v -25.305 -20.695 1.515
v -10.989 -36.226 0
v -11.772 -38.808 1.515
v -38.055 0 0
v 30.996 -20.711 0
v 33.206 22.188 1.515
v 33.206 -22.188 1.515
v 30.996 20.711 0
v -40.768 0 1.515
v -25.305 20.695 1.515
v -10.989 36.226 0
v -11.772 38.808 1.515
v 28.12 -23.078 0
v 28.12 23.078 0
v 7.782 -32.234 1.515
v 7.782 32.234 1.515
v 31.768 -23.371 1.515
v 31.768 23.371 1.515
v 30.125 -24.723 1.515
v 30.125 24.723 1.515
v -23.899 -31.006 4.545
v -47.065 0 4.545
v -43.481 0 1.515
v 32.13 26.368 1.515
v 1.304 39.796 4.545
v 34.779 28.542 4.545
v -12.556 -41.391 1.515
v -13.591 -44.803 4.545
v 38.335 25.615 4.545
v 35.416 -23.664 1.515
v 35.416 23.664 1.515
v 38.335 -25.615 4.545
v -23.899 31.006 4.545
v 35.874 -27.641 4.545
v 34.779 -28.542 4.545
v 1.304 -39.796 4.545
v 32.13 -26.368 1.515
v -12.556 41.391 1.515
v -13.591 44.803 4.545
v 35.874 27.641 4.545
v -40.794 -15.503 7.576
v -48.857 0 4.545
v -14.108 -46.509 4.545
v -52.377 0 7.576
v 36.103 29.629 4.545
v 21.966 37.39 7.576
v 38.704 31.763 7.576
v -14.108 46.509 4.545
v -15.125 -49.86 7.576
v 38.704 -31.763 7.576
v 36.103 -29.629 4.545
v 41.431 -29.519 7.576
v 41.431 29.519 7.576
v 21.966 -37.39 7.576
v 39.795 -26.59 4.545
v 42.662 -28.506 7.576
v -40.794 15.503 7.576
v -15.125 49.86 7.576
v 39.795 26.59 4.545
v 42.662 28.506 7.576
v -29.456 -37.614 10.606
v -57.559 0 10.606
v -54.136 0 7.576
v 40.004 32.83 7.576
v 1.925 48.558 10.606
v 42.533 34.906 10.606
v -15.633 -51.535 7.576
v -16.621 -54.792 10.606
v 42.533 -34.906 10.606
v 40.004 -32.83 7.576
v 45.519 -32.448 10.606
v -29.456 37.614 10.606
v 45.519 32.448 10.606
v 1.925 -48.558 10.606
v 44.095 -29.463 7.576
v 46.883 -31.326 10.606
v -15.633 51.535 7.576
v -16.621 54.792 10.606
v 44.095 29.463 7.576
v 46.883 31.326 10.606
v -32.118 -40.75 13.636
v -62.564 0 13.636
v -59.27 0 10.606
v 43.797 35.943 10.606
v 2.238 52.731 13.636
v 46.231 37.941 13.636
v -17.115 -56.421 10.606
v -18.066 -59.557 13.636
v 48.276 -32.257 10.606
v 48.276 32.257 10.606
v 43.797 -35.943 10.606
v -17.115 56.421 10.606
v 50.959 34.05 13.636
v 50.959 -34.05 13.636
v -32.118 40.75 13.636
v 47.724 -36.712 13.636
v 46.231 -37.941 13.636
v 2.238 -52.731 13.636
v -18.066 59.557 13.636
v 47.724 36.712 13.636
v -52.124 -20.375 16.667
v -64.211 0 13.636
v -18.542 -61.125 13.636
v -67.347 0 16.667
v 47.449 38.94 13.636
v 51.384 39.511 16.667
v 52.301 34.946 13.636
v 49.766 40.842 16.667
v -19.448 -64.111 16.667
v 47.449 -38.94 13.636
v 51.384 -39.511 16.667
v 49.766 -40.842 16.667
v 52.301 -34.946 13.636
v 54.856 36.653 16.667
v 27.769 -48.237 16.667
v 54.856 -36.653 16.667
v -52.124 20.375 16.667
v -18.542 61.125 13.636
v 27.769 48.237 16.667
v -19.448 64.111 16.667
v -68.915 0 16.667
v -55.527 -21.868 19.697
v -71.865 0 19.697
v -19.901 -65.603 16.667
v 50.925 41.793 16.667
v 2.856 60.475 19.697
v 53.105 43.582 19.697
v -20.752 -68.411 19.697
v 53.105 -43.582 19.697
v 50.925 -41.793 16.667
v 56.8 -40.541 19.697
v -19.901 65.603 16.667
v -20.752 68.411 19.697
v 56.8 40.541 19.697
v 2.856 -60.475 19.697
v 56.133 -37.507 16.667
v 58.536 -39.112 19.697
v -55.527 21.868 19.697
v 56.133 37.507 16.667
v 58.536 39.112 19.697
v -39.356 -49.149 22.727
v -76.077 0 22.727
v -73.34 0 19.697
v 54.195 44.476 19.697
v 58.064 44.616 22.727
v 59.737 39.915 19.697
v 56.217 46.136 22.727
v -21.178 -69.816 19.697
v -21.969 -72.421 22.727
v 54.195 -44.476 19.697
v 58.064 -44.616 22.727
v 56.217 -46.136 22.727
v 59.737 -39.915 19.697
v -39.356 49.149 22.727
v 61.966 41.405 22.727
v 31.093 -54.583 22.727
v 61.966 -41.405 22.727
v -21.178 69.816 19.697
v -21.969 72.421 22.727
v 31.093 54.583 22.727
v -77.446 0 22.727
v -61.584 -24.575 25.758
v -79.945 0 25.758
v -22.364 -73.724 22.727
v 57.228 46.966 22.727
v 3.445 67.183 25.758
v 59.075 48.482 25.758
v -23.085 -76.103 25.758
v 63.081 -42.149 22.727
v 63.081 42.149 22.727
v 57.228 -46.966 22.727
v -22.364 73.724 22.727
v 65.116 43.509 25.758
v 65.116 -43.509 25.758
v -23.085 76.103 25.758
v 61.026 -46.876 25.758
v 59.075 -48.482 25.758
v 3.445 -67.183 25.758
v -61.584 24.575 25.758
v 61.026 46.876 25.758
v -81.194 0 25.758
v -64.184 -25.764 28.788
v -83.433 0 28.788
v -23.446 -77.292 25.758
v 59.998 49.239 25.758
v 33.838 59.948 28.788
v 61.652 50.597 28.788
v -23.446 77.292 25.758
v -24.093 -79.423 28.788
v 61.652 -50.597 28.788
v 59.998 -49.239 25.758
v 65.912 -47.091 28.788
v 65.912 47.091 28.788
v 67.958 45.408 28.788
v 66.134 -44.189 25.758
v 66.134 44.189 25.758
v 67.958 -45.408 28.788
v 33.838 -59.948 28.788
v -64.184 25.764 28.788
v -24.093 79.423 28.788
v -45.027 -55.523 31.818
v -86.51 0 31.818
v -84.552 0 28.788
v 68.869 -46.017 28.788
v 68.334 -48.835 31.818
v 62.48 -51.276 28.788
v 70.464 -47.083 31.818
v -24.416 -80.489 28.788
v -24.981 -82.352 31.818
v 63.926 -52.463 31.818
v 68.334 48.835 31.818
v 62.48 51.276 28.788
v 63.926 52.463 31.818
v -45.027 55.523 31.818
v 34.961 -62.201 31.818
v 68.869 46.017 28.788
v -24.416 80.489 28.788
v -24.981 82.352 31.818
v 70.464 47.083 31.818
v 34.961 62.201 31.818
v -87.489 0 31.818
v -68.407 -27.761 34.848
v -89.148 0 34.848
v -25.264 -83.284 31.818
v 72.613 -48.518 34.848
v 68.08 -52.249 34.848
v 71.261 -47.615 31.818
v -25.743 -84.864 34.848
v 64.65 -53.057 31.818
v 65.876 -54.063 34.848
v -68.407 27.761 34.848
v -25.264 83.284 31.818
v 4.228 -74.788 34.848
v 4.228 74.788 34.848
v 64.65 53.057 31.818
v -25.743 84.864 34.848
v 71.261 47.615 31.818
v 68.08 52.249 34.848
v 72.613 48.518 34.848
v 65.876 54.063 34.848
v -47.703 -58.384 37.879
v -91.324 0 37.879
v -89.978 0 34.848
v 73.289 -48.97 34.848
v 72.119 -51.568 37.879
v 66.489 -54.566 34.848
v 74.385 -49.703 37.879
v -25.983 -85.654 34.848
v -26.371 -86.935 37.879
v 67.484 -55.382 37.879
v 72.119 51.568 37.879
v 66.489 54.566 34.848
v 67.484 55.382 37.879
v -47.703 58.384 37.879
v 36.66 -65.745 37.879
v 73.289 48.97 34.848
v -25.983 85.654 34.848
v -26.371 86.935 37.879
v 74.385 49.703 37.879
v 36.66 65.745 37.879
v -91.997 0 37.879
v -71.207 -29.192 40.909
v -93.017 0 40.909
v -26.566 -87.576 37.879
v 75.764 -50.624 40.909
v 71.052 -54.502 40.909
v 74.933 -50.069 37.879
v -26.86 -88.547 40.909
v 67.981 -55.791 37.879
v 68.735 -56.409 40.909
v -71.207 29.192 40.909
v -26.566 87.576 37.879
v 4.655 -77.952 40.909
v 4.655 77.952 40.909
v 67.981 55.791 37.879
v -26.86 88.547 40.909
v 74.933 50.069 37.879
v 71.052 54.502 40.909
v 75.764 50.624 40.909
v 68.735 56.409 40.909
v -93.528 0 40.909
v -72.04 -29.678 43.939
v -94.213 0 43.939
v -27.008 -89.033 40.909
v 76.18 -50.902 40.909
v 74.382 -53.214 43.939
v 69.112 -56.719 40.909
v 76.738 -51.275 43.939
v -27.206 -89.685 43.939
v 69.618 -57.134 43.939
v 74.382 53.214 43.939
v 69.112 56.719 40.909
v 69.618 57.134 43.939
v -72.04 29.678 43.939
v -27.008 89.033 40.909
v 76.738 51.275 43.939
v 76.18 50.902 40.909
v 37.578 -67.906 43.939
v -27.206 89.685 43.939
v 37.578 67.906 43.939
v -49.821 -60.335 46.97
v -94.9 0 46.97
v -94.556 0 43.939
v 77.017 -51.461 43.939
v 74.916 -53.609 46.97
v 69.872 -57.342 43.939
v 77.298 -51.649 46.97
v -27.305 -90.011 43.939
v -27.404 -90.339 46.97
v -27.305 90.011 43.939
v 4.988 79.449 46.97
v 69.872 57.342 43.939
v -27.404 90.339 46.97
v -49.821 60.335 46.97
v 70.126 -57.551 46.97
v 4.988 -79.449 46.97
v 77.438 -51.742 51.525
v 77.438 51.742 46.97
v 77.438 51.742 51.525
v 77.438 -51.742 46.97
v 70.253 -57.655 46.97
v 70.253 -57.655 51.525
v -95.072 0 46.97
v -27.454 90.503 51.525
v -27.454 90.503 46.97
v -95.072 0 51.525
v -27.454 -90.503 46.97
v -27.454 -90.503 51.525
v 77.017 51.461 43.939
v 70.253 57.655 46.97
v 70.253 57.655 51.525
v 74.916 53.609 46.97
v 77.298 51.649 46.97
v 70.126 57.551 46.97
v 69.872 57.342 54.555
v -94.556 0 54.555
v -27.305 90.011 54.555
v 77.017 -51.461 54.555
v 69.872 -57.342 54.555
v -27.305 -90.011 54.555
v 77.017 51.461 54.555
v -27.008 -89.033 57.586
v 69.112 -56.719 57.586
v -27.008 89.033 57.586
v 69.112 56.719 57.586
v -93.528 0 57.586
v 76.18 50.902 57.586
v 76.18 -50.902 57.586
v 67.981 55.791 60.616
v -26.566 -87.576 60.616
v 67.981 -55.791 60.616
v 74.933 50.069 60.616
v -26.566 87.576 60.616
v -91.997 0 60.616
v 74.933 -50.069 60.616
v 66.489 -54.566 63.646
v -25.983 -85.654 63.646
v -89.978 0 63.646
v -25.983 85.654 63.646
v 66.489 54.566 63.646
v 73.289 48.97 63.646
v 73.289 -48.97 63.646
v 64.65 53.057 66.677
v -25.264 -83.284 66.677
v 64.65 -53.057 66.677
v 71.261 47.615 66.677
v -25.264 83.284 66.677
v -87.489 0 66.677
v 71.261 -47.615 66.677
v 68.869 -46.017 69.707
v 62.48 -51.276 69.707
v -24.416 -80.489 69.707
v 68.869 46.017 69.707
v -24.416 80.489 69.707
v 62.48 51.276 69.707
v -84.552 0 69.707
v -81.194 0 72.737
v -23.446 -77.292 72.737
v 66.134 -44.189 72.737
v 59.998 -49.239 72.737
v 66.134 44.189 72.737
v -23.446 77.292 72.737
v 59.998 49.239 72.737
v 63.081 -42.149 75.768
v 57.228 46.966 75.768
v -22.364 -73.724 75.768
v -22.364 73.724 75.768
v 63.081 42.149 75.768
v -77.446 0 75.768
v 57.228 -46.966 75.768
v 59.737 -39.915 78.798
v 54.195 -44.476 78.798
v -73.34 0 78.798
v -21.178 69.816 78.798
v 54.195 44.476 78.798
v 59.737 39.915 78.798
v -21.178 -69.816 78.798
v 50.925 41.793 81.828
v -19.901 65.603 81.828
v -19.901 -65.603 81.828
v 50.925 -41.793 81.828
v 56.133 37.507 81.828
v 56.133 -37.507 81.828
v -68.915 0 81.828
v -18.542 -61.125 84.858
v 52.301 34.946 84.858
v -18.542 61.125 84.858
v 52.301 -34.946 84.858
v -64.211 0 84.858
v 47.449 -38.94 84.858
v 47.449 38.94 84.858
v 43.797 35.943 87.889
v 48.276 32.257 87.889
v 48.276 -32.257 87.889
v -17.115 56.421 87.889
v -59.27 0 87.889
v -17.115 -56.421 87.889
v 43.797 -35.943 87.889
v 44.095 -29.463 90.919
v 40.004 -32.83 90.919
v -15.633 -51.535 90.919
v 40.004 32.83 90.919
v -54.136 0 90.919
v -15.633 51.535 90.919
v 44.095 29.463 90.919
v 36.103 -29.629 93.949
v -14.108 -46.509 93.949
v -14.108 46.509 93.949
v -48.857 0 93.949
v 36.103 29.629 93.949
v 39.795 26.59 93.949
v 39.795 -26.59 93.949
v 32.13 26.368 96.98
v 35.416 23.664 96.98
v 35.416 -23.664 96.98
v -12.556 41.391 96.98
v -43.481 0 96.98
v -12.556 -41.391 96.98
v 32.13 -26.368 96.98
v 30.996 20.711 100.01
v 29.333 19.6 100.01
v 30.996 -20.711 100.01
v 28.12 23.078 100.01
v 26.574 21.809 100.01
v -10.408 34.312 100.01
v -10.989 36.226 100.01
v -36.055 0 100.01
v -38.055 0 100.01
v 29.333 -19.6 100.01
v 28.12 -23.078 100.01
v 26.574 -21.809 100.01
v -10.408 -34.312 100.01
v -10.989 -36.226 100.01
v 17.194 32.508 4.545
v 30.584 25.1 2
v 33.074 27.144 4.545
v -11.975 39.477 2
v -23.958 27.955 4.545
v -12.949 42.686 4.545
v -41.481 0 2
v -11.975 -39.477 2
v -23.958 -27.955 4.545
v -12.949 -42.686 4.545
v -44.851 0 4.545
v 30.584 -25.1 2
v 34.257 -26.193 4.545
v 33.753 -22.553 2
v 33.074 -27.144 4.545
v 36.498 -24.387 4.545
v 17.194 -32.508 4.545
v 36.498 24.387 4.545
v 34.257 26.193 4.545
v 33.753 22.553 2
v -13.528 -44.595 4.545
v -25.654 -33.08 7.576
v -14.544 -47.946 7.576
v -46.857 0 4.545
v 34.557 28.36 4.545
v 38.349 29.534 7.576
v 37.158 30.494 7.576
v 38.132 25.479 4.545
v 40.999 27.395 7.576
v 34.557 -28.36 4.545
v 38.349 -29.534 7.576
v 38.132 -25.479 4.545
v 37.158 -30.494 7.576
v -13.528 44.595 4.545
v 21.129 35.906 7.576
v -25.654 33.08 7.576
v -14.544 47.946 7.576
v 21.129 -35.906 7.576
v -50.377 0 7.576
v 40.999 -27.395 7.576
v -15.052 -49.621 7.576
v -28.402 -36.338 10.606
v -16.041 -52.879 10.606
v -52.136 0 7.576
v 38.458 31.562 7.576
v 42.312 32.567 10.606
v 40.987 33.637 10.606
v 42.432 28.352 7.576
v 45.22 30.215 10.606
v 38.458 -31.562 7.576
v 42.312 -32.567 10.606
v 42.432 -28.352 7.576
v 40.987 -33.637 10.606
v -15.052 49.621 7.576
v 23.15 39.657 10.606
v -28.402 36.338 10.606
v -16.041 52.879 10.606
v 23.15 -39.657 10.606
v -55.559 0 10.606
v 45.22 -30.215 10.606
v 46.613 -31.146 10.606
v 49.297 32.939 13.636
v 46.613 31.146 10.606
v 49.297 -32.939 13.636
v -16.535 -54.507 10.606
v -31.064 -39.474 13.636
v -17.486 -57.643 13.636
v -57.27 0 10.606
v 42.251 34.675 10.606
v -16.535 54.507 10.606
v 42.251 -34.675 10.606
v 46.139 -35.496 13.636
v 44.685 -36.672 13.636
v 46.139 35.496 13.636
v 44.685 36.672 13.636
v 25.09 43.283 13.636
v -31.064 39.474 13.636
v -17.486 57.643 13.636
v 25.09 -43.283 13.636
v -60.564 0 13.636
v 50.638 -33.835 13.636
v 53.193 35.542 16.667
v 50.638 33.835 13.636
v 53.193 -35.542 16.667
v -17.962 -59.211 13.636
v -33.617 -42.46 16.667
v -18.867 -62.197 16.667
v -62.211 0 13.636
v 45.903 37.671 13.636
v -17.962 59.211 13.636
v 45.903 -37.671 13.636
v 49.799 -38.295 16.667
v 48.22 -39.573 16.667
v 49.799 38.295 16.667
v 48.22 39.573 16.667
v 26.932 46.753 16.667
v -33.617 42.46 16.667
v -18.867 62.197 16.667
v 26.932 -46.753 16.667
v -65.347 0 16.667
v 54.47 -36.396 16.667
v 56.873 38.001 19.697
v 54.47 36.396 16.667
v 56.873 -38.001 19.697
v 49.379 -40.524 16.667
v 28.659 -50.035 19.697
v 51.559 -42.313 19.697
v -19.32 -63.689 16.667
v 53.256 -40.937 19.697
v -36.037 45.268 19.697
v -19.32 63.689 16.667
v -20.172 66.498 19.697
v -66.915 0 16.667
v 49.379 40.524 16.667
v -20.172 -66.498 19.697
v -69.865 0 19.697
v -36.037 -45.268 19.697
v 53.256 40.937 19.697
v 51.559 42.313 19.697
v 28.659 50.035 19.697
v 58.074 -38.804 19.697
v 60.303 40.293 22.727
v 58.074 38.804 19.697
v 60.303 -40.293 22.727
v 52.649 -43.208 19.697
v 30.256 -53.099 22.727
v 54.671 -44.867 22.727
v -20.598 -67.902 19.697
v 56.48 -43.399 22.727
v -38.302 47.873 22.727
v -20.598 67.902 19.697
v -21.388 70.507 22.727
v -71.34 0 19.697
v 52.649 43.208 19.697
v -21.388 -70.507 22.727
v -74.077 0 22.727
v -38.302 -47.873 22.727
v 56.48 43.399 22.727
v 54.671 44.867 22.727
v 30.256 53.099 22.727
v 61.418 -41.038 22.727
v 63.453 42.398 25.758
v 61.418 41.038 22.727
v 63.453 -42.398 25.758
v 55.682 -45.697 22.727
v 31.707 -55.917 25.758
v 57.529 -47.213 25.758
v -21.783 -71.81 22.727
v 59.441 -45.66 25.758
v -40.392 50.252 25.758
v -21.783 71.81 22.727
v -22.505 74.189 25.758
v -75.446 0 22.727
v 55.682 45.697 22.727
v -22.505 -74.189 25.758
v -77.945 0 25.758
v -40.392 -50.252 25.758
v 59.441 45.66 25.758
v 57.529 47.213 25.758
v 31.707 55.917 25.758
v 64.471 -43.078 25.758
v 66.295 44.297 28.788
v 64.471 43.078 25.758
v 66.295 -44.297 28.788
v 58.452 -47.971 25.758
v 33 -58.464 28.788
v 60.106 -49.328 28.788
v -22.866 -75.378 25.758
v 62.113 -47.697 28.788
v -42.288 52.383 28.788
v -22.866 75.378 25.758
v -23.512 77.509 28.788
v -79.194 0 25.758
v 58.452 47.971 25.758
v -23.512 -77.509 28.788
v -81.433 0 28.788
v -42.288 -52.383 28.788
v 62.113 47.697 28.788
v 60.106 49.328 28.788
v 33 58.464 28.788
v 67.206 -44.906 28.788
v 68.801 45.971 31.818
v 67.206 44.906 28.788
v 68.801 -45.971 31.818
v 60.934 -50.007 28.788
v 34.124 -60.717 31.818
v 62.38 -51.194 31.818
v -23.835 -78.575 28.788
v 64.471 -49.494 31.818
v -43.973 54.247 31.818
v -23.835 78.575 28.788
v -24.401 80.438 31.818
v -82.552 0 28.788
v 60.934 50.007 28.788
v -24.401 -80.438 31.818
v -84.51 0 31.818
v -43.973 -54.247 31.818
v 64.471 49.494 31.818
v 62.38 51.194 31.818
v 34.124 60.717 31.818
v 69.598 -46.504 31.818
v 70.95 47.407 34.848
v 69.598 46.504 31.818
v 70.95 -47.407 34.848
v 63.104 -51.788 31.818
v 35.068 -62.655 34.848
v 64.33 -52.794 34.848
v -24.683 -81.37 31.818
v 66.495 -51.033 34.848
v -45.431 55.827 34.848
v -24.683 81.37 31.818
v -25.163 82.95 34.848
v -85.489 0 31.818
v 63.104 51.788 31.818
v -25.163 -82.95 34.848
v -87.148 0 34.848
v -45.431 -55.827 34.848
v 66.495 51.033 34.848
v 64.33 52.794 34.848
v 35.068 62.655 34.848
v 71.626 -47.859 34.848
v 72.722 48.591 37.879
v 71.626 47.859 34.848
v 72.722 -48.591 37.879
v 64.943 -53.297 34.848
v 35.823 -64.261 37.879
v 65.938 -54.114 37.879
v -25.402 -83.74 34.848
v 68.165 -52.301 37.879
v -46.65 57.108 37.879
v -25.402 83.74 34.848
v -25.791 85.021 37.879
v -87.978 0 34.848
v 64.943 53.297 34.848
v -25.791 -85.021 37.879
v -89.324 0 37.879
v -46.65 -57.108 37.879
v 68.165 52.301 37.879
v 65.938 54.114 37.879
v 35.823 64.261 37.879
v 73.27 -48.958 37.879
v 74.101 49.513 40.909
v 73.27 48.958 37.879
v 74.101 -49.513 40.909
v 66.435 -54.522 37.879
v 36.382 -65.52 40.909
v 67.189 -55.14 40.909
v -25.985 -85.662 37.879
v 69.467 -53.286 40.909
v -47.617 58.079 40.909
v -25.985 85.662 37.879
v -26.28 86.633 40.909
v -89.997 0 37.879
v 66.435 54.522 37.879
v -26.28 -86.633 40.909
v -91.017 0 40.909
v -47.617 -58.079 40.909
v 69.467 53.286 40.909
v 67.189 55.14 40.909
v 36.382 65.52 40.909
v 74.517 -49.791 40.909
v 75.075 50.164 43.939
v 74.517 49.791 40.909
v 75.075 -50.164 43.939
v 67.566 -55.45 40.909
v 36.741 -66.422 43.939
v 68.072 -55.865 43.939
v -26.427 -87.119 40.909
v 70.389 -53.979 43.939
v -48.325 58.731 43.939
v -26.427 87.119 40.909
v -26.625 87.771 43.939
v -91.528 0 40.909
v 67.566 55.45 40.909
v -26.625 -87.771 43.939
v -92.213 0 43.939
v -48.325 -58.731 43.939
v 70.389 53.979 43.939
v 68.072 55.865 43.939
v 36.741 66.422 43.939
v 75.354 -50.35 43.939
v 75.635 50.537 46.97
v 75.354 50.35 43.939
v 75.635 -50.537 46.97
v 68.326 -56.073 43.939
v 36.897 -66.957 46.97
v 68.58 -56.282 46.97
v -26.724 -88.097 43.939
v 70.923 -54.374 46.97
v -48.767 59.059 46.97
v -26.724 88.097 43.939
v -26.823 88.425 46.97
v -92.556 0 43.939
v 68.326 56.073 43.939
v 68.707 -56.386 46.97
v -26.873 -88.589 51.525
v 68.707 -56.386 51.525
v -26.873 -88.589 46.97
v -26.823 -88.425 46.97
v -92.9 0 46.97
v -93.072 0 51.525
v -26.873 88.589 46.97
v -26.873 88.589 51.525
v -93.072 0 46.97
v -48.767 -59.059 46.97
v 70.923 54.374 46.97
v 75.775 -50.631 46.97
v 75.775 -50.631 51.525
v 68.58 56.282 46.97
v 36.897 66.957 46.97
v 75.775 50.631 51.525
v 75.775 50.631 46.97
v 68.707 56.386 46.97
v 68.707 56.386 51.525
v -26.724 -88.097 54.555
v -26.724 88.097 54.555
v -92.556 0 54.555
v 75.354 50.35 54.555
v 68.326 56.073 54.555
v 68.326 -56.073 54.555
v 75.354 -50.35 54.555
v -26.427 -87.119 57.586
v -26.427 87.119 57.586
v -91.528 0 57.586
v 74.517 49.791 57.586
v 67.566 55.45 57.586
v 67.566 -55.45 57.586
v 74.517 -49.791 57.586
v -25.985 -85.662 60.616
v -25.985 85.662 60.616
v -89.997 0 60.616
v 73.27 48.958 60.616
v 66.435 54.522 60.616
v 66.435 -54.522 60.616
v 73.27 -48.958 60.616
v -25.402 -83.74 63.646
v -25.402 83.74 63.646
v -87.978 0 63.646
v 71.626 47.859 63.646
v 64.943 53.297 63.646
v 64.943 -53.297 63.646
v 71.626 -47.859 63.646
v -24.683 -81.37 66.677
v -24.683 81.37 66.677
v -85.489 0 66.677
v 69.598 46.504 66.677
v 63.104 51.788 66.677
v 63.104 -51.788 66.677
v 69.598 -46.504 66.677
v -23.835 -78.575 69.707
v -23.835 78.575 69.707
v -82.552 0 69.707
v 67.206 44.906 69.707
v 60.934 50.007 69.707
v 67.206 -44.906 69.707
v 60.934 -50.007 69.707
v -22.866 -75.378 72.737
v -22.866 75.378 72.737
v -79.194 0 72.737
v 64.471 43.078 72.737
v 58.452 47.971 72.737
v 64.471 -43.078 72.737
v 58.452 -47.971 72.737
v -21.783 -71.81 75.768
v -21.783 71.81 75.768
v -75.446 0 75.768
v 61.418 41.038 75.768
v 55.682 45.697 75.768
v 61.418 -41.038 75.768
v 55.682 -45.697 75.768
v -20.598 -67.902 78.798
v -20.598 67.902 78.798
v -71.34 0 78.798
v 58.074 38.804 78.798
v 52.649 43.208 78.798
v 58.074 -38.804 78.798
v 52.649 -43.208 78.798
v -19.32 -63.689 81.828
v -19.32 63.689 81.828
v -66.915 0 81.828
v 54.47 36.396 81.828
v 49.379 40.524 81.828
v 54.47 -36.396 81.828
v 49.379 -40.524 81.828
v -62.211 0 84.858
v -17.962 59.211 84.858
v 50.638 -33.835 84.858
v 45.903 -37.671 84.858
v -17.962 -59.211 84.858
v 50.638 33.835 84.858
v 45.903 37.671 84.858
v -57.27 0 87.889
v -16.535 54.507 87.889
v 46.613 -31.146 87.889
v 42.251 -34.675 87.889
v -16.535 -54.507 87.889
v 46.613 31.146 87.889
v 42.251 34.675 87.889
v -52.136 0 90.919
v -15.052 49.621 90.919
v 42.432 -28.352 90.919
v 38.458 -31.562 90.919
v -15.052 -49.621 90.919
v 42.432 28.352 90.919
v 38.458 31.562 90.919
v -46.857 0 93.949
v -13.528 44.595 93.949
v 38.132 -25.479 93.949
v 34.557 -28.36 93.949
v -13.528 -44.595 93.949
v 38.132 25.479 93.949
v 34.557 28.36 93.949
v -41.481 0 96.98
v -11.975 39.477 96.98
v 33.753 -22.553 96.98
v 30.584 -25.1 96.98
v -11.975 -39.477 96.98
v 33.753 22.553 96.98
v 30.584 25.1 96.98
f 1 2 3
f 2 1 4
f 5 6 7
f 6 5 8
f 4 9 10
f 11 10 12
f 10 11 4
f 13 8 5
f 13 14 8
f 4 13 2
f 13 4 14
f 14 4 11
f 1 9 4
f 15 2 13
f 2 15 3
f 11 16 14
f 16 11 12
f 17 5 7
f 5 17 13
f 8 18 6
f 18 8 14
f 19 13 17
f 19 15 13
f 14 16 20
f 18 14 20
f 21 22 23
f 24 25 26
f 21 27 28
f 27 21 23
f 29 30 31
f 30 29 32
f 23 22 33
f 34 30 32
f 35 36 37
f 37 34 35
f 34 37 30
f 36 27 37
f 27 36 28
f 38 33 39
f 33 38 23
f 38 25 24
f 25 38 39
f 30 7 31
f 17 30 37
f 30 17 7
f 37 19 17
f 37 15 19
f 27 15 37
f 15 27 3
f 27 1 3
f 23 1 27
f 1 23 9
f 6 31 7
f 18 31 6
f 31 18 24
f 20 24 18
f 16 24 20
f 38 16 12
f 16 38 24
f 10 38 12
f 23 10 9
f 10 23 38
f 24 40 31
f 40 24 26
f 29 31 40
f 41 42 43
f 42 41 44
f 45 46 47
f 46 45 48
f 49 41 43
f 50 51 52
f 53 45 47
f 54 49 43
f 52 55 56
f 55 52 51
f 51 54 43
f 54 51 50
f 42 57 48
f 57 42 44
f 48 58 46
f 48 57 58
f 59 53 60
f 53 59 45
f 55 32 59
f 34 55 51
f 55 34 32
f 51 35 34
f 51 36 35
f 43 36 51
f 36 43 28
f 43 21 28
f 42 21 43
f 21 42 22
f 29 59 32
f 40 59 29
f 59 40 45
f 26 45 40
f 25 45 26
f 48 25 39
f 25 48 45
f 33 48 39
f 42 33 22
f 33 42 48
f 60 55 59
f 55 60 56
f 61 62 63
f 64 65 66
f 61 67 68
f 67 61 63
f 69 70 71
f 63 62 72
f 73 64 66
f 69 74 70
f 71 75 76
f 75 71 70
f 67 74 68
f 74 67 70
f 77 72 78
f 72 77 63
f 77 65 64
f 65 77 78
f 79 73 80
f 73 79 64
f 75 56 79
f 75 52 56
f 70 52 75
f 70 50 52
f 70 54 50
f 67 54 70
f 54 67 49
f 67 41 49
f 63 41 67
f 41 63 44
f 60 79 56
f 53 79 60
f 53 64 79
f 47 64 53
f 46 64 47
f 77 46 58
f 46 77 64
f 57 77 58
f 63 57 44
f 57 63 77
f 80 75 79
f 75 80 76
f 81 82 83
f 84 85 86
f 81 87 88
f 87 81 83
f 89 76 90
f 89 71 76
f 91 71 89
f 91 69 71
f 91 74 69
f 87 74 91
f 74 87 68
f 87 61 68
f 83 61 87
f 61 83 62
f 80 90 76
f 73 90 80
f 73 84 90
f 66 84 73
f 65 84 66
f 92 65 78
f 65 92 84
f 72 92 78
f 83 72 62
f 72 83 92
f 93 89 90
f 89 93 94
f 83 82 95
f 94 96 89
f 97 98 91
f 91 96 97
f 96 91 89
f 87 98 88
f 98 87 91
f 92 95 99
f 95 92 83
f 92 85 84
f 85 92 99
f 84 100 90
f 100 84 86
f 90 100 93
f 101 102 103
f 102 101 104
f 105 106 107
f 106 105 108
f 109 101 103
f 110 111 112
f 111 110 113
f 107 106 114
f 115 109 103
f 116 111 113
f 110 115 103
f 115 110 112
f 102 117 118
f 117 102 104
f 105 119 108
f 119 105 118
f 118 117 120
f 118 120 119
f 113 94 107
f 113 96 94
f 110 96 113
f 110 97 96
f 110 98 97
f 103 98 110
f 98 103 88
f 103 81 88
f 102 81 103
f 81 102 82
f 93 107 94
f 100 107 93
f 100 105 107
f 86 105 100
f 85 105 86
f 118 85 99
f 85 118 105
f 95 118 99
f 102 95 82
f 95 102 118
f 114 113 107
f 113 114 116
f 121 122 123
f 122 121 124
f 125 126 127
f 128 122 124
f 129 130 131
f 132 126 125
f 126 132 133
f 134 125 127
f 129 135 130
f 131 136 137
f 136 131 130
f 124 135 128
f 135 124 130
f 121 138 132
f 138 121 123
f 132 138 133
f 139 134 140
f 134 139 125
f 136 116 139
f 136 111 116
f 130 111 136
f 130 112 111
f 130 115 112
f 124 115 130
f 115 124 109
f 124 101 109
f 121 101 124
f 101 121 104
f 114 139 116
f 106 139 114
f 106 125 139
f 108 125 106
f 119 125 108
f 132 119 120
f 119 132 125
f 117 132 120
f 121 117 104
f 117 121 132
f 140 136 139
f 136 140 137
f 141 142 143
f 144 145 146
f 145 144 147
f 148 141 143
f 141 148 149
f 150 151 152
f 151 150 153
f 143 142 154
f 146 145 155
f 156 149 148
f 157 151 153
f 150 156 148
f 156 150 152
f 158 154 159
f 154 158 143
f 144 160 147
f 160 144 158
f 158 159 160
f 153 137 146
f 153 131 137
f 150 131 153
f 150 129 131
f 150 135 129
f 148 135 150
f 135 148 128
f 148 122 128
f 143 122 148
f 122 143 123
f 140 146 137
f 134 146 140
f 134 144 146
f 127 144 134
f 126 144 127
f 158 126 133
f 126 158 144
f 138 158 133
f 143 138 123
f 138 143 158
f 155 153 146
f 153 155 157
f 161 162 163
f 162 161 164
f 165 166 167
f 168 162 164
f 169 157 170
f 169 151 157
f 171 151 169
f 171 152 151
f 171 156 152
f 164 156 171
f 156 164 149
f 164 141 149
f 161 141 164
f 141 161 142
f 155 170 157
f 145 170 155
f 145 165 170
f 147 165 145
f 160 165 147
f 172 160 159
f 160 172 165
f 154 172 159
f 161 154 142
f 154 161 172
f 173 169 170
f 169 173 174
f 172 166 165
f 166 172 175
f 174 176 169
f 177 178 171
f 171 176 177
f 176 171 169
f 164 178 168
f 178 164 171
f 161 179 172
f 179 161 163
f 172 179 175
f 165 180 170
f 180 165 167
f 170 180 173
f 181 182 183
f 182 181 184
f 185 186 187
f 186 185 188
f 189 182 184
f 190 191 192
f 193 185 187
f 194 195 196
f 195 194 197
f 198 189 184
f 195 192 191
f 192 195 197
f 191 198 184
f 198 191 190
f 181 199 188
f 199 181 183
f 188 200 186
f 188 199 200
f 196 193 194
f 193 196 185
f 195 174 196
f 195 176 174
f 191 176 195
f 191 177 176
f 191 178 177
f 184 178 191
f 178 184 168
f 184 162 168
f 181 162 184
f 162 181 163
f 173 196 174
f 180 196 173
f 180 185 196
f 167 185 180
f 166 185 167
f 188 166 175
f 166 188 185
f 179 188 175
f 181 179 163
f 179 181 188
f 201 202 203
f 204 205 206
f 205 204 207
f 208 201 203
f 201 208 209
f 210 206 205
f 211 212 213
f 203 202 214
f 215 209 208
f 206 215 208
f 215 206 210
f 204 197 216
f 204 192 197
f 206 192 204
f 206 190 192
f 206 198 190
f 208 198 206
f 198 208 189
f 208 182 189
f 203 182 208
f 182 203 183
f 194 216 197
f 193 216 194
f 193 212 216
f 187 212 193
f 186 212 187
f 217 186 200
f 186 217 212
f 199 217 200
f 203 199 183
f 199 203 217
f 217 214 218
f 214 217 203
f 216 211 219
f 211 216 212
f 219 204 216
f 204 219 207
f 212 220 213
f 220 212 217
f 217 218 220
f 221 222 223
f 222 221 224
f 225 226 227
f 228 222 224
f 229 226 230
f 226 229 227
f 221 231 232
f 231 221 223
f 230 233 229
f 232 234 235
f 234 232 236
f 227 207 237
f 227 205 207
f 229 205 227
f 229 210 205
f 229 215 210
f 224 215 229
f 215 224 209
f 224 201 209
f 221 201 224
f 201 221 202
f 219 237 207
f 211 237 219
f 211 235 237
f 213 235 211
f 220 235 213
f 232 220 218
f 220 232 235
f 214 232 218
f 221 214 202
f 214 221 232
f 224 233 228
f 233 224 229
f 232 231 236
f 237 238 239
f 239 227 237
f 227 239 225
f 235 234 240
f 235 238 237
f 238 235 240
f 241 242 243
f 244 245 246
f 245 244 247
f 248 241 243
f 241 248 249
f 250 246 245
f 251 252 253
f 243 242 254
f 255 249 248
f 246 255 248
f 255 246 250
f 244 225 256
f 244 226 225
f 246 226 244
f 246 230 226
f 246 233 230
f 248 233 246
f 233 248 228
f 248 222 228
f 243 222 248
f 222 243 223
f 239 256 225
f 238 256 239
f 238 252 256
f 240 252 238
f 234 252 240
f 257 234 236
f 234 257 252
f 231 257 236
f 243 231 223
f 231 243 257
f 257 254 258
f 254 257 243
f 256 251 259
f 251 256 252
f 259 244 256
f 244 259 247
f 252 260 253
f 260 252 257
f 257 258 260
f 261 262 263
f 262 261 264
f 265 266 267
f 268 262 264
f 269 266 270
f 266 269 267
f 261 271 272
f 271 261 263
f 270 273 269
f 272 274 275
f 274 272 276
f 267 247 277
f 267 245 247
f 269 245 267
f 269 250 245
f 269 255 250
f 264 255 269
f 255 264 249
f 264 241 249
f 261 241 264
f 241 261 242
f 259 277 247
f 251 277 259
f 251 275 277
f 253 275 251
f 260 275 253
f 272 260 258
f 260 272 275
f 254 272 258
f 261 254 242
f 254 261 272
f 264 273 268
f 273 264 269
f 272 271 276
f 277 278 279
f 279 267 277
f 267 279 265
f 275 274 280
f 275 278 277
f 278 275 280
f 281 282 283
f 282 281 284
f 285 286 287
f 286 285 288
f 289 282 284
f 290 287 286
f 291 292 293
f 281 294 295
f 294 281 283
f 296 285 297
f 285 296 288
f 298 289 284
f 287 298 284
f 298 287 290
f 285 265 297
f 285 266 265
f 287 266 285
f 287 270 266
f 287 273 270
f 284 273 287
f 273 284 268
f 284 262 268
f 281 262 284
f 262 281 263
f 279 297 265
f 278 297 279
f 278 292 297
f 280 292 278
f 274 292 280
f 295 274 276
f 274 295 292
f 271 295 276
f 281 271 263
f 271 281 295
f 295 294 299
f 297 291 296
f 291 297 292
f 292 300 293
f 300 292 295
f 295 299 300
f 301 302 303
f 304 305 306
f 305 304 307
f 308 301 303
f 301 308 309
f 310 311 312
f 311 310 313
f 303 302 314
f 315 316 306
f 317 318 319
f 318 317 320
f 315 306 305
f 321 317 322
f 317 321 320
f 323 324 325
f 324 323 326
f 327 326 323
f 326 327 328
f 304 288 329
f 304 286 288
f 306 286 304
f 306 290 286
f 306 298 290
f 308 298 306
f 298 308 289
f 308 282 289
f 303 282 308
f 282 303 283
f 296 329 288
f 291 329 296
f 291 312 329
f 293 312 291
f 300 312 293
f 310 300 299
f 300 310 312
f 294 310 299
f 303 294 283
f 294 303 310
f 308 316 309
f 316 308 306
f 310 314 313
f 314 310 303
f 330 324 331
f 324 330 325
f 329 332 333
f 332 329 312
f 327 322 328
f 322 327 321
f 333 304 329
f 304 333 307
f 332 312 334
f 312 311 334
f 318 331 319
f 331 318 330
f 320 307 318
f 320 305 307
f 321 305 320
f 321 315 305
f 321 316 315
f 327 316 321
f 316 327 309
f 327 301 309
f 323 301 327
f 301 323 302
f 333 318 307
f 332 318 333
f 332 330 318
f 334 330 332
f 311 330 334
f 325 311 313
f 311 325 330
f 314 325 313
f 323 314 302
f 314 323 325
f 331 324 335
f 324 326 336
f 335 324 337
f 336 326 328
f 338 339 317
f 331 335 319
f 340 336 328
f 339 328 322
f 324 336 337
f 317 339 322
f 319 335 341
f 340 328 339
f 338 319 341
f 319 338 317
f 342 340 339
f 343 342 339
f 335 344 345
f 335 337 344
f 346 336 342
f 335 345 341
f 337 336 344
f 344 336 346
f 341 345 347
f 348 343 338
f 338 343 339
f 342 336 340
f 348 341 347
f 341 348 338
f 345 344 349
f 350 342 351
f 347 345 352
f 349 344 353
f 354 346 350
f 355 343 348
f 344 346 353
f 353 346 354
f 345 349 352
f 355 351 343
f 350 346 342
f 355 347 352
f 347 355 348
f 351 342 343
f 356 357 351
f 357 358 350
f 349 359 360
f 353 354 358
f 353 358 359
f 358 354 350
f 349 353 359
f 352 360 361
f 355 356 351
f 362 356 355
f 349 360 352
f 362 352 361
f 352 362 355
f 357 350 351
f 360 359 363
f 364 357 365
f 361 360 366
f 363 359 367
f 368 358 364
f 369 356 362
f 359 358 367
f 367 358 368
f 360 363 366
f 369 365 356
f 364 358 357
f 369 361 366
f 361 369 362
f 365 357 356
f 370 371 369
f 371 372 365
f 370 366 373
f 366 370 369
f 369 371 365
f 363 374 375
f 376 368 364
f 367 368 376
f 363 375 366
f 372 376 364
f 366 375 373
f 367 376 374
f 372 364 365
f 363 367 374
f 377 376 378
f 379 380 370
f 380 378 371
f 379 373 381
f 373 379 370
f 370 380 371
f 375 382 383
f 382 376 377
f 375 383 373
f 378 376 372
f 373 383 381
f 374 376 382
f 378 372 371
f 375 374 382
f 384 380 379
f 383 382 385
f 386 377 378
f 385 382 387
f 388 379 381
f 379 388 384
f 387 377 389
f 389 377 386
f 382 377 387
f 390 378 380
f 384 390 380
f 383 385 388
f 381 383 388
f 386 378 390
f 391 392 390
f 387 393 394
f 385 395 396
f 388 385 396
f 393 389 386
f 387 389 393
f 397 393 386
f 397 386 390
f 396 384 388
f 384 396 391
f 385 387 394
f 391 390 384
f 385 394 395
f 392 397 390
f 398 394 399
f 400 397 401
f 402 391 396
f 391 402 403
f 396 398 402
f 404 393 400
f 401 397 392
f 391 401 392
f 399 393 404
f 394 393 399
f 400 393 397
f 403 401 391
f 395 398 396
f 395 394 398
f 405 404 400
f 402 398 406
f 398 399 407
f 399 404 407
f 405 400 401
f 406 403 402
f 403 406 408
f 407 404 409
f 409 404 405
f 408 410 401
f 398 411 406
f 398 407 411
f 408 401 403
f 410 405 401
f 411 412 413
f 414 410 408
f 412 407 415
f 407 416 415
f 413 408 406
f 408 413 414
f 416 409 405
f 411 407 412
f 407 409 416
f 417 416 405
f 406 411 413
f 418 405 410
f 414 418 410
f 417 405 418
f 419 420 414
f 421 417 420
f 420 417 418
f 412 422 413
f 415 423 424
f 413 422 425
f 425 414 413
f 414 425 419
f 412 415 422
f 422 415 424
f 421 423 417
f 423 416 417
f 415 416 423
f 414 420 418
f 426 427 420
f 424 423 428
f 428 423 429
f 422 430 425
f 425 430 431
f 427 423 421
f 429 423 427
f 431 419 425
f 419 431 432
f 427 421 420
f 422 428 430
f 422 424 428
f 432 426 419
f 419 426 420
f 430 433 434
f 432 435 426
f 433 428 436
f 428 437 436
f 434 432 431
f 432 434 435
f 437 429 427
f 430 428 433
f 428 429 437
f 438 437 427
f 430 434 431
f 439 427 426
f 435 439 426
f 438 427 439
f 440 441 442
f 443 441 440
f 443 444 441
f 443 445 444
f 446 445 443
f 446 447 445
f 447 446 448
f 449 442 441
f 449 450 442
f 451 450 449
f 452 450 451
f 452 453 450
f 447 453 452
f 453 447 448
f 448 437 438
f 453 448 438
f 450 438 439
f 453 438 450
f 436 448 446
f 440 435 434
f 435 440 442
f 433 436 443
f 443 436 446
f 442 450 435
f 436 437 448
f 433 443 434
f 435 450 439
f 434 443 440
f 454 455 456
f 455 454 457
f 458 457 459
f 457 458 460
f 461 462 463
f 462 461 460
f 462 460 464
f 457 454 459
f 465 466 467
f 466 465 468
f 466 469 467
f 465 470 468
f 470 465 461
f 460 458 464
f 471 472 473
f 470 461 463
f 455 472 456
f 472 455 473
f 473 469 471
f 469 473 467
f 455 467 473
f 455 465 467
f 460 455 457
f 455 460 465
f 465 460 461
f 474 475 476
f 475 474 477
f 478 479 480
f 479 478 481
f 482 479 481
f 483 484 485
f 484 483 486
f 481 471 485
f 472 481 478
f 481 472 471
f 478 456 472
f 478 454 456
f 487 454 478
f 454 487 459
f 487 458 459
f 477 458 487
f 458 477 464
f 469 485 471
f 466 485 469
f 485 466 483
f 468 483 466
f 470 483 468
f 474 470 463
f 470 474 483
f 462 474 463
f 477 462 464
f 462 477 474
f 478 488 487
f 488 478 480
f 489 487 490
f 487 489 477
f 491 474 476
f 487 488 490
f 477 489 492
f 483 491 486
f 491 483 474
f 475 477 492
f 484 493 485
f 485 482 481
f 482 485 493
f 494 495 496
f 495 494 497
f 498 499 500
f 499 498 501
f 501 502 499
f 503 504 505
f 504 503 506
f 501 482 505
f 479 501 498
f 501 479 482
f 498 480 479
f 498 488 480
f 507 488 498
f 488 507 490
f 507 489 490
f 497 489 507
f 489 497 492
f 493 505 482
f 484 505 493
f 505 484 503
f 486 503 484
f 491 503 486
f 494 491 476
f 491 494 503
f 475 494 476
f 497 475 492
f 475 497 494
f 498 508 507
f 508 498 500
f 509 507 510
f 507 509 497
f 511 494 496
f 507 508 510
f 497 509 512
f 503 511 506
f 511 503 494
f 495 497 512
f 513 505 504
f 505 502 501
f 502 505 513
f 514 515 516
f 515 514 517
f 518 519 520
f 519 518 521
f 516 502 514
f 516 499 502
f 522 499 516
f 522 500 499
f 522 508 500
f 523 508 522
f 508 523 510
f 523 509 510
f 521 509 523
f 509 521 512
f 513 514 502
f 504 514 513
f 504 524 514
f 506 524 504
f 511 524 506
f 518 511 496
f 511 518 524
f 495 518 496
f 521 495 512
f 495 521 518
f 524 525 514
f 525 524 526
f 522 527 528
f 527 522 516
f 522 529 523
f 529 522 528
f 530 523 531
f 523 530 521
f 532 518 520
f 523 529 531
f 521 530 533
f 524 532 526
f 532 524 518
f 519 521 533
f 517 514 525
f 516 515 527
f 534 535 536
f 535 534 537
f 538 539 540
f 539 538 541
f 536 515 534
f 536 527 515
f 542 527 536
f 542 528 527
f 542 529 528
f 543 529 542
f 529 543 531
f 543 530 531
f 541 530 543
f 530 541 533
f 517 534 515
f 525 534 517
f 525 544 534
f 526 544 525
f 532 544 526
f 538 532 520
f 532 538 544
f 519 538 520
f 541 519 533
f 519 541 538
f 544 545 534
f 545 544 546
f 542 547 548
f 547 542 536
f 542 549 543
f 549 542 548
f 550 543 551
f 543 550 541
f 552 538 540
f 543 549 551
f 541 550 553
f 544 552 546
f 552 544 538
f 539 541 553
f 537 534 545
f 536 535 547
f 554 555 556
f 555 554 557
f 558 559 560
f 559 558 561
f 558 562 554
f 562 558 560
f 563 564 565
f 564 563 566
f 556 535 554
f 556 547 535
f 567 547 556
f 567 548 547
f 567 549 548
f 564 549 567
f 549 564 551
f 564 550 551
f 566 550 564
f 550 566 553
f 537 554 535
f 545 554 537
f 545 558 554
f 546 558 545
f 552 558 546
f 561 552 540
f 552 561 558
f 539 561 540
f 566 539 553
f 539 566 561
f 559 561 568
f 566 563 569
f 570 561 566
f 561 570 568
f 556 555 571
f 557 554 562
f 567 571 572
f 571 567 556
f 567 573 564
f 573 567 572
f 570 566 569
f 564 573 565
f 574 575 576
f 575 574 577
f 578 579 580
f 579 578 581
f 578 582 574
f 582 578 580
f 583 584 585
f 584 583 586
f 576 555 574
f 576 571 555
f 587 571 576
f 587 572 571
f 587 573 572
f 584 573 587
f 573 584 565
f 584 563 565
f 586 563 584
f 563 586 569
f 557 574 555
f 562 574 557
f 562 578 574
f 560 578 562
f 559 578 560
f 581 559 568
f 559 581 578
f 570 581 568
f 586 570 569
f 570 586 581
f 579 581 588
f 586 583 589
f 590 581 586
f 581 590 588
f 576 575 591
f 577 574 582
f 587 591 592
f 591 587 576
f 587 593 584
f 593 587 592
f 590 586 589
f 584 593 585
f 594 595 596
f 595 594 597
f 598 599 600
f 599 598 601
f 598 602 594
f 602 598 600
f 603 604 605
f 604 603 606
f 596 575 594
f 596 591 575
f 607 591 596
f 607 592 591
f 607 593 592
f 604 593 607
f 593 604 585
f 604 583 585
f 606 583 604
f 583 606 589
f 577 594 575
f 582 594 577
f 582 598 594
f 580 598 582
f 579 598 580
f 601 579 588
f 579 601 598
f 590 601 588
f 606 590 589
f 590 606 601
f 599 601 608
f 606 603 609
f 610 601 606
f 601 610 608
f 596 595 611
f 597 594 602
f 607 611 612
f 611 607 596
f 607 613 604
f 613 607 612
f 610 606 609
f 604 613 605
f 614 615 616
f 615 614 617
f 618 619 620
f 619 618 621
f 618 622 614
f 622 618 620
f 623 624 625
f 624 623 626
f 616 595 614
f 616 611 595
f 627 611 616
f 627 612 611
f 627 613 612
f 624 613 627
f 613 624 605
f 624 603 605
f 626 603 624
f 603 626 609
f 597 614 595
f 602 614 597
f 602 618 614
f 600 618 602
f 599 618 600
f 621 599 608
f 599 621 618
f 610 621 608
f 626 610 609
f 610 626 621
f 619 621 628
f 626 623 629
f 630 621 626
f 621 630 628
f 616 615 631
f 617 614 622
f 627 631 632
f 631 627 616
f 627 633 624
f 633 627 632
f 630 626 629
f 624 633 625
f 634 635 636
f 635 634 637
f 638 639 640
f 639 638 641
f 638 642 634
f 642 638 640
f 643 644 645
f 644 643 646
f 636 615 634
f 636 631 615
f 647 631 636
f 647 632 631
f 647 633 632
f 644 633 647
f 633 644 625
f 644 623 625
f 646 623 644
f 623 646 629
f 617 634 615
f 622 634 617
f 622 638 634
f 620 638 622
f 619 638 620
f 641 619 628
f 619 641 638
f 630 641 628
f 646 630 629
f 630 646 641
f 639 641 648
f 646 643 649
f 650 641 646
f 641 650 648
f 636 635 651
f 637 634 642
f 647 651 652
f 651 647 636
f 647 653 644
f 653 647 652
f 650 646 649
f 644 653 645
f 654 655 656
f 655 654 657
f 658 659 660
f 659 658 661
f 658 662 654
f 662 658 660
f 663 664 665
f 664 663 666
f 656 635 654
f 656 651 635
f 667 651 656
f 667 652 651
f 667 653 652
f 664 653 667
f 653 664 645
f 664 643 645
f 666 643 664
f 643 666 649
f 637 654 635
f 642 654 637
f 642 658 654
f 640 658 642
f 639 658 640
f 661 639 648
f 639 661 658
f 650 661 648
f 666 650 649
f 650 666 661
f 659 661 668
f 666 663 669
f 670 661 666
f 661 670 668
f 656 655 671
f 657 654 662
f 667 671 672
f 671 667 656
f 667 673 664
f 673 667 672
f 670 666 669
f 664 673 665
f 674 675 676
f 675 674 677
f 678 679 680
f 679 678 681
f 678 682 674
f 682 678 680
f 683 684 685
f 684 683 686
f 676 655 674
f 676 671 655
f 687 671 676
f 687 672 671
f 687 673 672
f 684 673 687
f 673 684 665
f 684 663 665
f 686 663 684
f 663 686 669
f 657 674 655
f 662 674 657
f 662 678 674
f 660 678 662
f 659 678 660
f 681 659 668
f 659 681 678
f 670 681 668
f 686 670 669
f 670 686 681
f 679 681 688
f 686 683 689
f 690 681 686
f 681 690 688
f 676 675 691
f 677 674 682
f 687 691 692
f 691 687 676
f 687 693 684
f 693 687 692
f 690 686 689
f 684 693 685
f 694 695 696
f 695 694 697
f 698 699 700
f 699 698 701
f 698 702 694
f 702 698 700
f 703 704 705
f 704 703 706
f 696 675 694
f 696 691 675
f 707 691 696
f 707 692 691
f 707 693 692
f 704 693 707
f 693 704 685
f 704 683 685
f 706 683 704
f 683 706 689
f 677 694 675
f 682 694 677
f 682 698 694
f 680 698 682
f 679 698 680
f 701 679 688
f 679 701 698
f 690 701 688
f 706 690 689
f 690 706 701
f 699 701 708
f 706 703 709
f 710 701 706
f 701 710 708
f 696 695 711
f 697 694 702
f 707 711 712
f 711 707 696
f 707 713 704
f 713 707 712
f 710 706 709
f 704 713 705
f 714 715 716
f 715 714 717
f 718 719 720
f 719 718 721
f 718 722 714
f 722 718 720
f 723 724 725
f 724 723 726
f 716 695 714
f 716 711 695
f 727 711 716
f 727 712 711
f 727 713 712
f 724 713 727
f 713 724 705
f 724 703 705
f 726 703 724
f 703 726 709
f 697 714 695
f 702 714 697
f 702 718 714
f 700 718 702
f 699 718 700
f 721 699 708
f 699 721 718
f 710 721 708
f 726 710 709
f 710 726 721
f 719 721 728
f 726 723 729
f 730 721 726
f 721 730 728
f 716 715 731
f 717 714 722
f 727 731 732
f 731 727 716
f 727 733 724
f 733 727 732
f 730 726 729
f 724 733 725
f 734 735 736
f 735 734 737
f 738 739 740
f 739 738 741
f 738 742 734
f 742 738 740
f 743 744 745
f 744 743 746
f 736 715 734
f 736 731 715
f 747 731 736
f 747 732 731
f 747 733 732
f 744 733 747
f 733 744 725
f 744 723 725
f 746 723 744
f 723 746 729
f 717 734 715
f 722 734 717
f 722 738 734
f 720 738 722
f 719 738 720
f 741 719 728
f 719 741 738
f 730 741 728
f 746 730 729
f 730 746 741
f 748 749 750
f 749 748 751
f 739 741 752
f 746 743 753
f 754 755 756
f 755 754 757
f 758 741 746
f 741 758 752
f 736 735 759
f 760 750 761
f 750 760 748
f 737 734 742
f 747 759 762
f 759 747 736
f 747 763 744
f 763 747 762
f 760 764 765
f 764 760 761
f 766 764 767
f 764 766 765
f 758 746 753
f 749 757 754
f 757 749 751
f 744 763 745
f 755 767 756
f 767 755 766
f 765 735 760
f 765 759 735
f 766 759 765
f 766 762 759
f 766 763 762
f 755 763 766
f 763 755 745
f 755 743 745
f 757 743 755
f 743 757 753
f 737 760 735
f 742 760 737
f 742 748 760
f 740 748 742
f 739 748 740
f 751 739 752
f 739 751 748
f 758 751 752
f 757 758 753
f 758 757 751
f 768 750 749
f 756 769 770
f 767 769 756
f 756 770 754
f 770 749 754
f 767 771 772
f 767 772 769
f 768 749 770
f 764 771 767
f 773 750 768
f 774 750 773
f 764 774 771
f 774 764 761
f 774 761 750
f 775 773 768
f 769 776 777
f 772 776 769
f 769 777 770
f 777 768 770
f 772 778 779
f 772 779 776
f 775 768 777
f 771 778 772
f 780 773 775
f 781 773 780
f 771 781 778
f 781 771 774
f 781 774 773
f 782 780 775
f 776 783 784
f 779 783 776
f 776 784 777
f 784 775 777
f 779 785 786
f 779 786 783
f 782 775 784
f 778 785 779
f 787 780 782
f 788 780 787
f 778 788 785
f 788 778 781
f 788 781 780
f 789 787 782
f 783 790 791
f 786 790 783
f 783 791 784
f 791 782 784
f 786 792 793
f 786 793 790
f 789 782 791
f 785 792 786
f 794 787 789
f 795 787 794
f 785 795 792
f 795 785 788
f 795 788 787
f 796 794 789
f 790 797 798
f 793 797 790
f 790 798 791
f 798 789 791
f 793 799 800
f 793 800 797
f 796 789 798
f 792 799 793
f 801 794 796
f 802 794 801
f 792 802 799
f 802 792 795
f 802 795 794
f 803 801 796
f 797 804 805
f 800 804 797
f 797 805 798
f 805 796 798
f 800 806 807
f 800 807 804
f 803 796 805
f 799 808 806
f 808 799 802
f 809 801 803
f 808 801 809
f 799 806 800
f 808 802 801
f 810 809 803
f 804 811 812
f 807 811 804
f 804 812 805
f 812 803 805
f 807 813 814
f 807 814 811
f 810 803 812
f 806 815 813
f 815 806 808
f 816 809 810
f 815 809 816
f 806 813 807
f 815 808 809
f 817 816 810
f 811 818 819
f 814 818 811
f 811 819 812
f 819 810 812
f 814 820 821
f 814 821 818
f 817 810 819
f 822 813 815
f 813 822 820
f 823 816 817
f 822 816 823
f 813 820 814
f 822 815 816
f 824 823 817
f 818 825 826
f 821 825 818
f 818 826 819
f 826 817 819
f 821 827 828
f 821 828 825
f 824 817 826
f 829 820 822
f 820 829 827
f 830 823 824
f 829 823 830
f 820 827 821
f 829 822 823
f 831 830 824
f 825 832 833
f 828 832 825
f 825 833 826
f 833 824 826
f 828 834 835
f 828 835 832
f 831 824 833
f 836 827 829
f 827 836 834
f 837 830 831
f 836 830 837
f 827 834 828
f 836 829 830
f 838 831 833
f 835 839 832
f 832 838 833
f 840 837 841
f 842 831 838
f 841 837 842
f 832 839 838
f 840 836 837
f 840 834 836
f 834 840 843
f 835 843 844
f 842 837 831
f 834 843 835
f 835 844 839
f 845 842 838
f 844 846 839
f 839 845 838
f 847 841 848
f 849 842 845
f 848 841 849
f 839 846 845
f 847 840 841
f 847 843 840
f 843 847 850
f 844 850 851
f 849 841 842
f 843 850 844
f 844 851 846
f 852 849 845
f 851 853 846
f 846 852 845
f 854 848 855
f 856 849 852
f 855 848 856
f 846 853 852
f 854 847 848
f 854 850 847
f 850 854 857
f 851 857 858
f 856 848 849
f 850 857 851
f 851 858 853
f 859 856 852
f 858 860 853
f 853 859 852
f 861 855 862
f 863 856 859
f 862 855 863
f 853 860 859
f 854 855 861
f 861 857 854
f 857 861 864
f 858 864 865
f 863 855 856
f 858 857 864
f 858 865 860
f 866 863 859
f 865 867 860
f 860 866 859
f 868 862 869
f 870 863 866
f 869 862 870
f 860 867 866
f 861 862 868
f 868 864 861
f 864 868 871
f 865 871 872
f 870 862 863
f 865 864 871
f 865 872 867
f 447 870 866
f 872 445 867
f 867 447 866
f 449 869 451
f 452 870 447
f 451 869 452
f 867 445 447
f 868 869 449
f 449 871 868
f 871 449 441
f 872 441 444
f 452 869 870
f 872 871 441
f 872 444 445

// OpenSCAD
// Yantra4D Superformula Vase
// Generates cross-sections using Gielis superformula
// Extrudes with varying parameters along height for vase shape

// --- Parameters (overridden by platform) ---
m1 = 5;
m2 = 5;
n1 = 2;
n2 = 7;
n3 = 7;
height = 100;
wall_thickness = 2;
radius = 40;
fn = 0;
render_mode = 0;

$fn = fn > 0 ? fn : 48;
steps = max(20, floor(height / 3));
// Vertical overlap between consecutive stacked slabs, so their seams are
// volumetric rather than coincident faces.
lap = height / steps * 0.5;

// Gielis superformula: compute radius at angle phi
// r(phi) = ( |cos(m*phi/4)/a|^n2 + |sin(m*phi/4)/b|^n3 ) ^ (-1/n1)
function sf_r(phi, m, n1_v, n2_v, n3_v, a=1, b=1) =
    let(
        t1 = abs(cos(m * phi / 4) / a),
        t2 = abs(sin(m * phi / 4) / b)
    )
    pow(pow(t1, n2_v) + pow(t2, n3_v), -1 / n1_v);

// Generate superformula cross-section points at given scale
// `inset` is subtracted from the FINAL point radius, not from `r`. Subtracting
// it from `r` makes the effective wall scale with sf_r, so on a deeply lobed
// profile the valleys end up thinner than the nominal wall (1.06 mm against a
// nominal 1.5 mm at the sea_urchin preset).
function sf_shape(r, m, n1_v, n2_v, n3_v, pts=64, inset=0) =
    [for (i = [0:pts-1])
        let(phi = i * 360 / pts,
            sr = sf_r(phi, m, n1_v, n2_v, n3_v),
            rr = max(0.5, r * sr - inset))
        [rr * cos(phi), rr * sin(phi)]
    ];

// Vase profile: taper from narrow base to wider body, then narrow at top
function vase_radius(z, h, r) =
    let(t = z / h)
    r * (0.4 + 0.6 * sin(t * 180));  // sinusoidal taper

// `h_top` clamps the stack: pass a value below `height` to stop the void short
// of the rim so the vase closes over. Defaults to the full height for the
// outer shell.
// `r_inset` shrinks the cross-section radius by a CONSTANT amount rather than
// scaling it proportionally, so the wall thickness is the same at the
// superformula's lobe tips as in its valleys.
//
// `z_floor` raises the BOTTOM of the stack without shifting the profile. The
// inner void needs a floor of wall_thickness, but the old code got it with
// translate([0, 0, wall_thickness]) around the whole body -- which also
// shifted the PROFILE up, so on the vase's descending half the void's radius
// was evaluated a wall_thickness lower down, where the vase is WIDER. The
// wall there went negative (-0.14 mm and worse over the top third at the
// sea_urchin preset) and the void ate the top of the vase. Slicing the floor
// off instead keeps r(z) aligned between the two shells at every height.
module vase_body(h_top = height, r_inset = 0, z_floor = 0) {
    // Stack cross-sections with hull approximation.
    //
    // The `for` MUST be wrapped in union(): a bare for-loop emits each hull()
    // as a separate top-level child, so the "vase" was `steps` disjoint
    // sibling solids, never one shape (the sweep read 3/5/7/9 bodies across
    // the presets and none of them watertight).
    union() {
        for (i = [0 : steps - 1]) {
            z0 = i * height / steps;
            z1 = (i + 1) * height / steps;
            if (z0 < h_top && z1 > z_floor) {
                zt = min(z1, h_top);
                r0 = vase_radius(max(z0, z_floor), height, radius);
                r1 = vase_radius(zt, height, radius);

                // Each hull() slab starts at its own z0 but is extruded down
                // by `lap` at the bottom cap, so consecutive slabs OVERLAP
                // instead of meeting on a coincident face. Stacking them face
                // to face left every seam as a zero-thickness contact, which
                // is why the union above still returned several disjoint
                // bodies rather than one solid.
                zb = max(z_floor, z0 - lap);
                hull() {
                    translate([0, 0, zb])
                        linear_extrude(z0 - zb + 0.01)
                            polygon(sf_shape(r0, m1, n1, n2, n3, 64, r_inset));
                    translate([0, 0, zt])
                        linear_extrude(0.01)
                            polygon(sf_shape(r1, m1, n1, n2, n3, 64, r_inset));
                }
            }
        }
    }
}

module vase_hollow() {
    difference() {
        vase_body();
        // Two fixes here.
        //
        // 1. The void has to be CLAMPED to the vase's own height. The old
        //    scale() had a Z factor of 1, so the void was the full-height body
        //    merely shifted up by wall_thickness and overshot the rim into
        //    open space -- the 13.5 mm parity gap against the CadQuery side,
        //    which clamps its own void to height - 0.01
        //    (superformula.py:94). Clamped to the same value here: the void
        //    still reaches the rim, so the vase is OPEN at the top the way a
        //    vase must be. Stopping it lower would seal the interior into an
        //    undrainable cavity (a 2-body render, one of them negative).
        //
        // 2. The old scale() shrank the cross-section PROPORTIONALLY. On a
        //    lobed superformula profile that is not a constant wall: the lobe
        //    tips, being furthest out, lose the most material and the wall
        //    there goes to zero, splitting the shell into one piece per lobe
        //    (4 bodies at m1=5, 10 at m1=8). Inset the radius by a constant
        //    instead, which is what superformula.py does.
        {
            vase_body(height, wall_thickness, wall_thickness);
            // OVERSHOOT the rim. Ending the void exactly at the top face
            // leaves a coincident face there, which OCCT/Manifold resolves as
            // a sealed cavity: the render came back as 2 bodies, the inner one
            // NEGATIVE (an undrainable void, and unprintable). Cap the void
            // with a slab of the topmost cross-section that runs clear past
            // the rim so the bore breaks through and the vase is open.
            // Sized on the OUTER body's own top radius so the cap is never
            // wider than the rim it breaks through, and started just BELOW
            // that rim (the void's own top slab already reaches it) so it only
            // continues the bore upward instead of trimming the vase. Starting
            // it a full wall_thickness down, or sizing it on a lower slab's
            // wider radius, shaved the top off wherever the profile narrows
            // toward the rim -- sea_urchin lost 11.4 mm of its 60 mm height.
            translate([0, 0, height - wall_thickness])
                linear_extrude(wall_thickness + 2)
                    polygon(sf_shape(vase_radius(height, height, radius),
                                     m1, n1, n2, n3, 64, wall_thickness));
        }
    }
}

// --- Render ---
if (render_mode == 0) {
    vase_hollow();
}
